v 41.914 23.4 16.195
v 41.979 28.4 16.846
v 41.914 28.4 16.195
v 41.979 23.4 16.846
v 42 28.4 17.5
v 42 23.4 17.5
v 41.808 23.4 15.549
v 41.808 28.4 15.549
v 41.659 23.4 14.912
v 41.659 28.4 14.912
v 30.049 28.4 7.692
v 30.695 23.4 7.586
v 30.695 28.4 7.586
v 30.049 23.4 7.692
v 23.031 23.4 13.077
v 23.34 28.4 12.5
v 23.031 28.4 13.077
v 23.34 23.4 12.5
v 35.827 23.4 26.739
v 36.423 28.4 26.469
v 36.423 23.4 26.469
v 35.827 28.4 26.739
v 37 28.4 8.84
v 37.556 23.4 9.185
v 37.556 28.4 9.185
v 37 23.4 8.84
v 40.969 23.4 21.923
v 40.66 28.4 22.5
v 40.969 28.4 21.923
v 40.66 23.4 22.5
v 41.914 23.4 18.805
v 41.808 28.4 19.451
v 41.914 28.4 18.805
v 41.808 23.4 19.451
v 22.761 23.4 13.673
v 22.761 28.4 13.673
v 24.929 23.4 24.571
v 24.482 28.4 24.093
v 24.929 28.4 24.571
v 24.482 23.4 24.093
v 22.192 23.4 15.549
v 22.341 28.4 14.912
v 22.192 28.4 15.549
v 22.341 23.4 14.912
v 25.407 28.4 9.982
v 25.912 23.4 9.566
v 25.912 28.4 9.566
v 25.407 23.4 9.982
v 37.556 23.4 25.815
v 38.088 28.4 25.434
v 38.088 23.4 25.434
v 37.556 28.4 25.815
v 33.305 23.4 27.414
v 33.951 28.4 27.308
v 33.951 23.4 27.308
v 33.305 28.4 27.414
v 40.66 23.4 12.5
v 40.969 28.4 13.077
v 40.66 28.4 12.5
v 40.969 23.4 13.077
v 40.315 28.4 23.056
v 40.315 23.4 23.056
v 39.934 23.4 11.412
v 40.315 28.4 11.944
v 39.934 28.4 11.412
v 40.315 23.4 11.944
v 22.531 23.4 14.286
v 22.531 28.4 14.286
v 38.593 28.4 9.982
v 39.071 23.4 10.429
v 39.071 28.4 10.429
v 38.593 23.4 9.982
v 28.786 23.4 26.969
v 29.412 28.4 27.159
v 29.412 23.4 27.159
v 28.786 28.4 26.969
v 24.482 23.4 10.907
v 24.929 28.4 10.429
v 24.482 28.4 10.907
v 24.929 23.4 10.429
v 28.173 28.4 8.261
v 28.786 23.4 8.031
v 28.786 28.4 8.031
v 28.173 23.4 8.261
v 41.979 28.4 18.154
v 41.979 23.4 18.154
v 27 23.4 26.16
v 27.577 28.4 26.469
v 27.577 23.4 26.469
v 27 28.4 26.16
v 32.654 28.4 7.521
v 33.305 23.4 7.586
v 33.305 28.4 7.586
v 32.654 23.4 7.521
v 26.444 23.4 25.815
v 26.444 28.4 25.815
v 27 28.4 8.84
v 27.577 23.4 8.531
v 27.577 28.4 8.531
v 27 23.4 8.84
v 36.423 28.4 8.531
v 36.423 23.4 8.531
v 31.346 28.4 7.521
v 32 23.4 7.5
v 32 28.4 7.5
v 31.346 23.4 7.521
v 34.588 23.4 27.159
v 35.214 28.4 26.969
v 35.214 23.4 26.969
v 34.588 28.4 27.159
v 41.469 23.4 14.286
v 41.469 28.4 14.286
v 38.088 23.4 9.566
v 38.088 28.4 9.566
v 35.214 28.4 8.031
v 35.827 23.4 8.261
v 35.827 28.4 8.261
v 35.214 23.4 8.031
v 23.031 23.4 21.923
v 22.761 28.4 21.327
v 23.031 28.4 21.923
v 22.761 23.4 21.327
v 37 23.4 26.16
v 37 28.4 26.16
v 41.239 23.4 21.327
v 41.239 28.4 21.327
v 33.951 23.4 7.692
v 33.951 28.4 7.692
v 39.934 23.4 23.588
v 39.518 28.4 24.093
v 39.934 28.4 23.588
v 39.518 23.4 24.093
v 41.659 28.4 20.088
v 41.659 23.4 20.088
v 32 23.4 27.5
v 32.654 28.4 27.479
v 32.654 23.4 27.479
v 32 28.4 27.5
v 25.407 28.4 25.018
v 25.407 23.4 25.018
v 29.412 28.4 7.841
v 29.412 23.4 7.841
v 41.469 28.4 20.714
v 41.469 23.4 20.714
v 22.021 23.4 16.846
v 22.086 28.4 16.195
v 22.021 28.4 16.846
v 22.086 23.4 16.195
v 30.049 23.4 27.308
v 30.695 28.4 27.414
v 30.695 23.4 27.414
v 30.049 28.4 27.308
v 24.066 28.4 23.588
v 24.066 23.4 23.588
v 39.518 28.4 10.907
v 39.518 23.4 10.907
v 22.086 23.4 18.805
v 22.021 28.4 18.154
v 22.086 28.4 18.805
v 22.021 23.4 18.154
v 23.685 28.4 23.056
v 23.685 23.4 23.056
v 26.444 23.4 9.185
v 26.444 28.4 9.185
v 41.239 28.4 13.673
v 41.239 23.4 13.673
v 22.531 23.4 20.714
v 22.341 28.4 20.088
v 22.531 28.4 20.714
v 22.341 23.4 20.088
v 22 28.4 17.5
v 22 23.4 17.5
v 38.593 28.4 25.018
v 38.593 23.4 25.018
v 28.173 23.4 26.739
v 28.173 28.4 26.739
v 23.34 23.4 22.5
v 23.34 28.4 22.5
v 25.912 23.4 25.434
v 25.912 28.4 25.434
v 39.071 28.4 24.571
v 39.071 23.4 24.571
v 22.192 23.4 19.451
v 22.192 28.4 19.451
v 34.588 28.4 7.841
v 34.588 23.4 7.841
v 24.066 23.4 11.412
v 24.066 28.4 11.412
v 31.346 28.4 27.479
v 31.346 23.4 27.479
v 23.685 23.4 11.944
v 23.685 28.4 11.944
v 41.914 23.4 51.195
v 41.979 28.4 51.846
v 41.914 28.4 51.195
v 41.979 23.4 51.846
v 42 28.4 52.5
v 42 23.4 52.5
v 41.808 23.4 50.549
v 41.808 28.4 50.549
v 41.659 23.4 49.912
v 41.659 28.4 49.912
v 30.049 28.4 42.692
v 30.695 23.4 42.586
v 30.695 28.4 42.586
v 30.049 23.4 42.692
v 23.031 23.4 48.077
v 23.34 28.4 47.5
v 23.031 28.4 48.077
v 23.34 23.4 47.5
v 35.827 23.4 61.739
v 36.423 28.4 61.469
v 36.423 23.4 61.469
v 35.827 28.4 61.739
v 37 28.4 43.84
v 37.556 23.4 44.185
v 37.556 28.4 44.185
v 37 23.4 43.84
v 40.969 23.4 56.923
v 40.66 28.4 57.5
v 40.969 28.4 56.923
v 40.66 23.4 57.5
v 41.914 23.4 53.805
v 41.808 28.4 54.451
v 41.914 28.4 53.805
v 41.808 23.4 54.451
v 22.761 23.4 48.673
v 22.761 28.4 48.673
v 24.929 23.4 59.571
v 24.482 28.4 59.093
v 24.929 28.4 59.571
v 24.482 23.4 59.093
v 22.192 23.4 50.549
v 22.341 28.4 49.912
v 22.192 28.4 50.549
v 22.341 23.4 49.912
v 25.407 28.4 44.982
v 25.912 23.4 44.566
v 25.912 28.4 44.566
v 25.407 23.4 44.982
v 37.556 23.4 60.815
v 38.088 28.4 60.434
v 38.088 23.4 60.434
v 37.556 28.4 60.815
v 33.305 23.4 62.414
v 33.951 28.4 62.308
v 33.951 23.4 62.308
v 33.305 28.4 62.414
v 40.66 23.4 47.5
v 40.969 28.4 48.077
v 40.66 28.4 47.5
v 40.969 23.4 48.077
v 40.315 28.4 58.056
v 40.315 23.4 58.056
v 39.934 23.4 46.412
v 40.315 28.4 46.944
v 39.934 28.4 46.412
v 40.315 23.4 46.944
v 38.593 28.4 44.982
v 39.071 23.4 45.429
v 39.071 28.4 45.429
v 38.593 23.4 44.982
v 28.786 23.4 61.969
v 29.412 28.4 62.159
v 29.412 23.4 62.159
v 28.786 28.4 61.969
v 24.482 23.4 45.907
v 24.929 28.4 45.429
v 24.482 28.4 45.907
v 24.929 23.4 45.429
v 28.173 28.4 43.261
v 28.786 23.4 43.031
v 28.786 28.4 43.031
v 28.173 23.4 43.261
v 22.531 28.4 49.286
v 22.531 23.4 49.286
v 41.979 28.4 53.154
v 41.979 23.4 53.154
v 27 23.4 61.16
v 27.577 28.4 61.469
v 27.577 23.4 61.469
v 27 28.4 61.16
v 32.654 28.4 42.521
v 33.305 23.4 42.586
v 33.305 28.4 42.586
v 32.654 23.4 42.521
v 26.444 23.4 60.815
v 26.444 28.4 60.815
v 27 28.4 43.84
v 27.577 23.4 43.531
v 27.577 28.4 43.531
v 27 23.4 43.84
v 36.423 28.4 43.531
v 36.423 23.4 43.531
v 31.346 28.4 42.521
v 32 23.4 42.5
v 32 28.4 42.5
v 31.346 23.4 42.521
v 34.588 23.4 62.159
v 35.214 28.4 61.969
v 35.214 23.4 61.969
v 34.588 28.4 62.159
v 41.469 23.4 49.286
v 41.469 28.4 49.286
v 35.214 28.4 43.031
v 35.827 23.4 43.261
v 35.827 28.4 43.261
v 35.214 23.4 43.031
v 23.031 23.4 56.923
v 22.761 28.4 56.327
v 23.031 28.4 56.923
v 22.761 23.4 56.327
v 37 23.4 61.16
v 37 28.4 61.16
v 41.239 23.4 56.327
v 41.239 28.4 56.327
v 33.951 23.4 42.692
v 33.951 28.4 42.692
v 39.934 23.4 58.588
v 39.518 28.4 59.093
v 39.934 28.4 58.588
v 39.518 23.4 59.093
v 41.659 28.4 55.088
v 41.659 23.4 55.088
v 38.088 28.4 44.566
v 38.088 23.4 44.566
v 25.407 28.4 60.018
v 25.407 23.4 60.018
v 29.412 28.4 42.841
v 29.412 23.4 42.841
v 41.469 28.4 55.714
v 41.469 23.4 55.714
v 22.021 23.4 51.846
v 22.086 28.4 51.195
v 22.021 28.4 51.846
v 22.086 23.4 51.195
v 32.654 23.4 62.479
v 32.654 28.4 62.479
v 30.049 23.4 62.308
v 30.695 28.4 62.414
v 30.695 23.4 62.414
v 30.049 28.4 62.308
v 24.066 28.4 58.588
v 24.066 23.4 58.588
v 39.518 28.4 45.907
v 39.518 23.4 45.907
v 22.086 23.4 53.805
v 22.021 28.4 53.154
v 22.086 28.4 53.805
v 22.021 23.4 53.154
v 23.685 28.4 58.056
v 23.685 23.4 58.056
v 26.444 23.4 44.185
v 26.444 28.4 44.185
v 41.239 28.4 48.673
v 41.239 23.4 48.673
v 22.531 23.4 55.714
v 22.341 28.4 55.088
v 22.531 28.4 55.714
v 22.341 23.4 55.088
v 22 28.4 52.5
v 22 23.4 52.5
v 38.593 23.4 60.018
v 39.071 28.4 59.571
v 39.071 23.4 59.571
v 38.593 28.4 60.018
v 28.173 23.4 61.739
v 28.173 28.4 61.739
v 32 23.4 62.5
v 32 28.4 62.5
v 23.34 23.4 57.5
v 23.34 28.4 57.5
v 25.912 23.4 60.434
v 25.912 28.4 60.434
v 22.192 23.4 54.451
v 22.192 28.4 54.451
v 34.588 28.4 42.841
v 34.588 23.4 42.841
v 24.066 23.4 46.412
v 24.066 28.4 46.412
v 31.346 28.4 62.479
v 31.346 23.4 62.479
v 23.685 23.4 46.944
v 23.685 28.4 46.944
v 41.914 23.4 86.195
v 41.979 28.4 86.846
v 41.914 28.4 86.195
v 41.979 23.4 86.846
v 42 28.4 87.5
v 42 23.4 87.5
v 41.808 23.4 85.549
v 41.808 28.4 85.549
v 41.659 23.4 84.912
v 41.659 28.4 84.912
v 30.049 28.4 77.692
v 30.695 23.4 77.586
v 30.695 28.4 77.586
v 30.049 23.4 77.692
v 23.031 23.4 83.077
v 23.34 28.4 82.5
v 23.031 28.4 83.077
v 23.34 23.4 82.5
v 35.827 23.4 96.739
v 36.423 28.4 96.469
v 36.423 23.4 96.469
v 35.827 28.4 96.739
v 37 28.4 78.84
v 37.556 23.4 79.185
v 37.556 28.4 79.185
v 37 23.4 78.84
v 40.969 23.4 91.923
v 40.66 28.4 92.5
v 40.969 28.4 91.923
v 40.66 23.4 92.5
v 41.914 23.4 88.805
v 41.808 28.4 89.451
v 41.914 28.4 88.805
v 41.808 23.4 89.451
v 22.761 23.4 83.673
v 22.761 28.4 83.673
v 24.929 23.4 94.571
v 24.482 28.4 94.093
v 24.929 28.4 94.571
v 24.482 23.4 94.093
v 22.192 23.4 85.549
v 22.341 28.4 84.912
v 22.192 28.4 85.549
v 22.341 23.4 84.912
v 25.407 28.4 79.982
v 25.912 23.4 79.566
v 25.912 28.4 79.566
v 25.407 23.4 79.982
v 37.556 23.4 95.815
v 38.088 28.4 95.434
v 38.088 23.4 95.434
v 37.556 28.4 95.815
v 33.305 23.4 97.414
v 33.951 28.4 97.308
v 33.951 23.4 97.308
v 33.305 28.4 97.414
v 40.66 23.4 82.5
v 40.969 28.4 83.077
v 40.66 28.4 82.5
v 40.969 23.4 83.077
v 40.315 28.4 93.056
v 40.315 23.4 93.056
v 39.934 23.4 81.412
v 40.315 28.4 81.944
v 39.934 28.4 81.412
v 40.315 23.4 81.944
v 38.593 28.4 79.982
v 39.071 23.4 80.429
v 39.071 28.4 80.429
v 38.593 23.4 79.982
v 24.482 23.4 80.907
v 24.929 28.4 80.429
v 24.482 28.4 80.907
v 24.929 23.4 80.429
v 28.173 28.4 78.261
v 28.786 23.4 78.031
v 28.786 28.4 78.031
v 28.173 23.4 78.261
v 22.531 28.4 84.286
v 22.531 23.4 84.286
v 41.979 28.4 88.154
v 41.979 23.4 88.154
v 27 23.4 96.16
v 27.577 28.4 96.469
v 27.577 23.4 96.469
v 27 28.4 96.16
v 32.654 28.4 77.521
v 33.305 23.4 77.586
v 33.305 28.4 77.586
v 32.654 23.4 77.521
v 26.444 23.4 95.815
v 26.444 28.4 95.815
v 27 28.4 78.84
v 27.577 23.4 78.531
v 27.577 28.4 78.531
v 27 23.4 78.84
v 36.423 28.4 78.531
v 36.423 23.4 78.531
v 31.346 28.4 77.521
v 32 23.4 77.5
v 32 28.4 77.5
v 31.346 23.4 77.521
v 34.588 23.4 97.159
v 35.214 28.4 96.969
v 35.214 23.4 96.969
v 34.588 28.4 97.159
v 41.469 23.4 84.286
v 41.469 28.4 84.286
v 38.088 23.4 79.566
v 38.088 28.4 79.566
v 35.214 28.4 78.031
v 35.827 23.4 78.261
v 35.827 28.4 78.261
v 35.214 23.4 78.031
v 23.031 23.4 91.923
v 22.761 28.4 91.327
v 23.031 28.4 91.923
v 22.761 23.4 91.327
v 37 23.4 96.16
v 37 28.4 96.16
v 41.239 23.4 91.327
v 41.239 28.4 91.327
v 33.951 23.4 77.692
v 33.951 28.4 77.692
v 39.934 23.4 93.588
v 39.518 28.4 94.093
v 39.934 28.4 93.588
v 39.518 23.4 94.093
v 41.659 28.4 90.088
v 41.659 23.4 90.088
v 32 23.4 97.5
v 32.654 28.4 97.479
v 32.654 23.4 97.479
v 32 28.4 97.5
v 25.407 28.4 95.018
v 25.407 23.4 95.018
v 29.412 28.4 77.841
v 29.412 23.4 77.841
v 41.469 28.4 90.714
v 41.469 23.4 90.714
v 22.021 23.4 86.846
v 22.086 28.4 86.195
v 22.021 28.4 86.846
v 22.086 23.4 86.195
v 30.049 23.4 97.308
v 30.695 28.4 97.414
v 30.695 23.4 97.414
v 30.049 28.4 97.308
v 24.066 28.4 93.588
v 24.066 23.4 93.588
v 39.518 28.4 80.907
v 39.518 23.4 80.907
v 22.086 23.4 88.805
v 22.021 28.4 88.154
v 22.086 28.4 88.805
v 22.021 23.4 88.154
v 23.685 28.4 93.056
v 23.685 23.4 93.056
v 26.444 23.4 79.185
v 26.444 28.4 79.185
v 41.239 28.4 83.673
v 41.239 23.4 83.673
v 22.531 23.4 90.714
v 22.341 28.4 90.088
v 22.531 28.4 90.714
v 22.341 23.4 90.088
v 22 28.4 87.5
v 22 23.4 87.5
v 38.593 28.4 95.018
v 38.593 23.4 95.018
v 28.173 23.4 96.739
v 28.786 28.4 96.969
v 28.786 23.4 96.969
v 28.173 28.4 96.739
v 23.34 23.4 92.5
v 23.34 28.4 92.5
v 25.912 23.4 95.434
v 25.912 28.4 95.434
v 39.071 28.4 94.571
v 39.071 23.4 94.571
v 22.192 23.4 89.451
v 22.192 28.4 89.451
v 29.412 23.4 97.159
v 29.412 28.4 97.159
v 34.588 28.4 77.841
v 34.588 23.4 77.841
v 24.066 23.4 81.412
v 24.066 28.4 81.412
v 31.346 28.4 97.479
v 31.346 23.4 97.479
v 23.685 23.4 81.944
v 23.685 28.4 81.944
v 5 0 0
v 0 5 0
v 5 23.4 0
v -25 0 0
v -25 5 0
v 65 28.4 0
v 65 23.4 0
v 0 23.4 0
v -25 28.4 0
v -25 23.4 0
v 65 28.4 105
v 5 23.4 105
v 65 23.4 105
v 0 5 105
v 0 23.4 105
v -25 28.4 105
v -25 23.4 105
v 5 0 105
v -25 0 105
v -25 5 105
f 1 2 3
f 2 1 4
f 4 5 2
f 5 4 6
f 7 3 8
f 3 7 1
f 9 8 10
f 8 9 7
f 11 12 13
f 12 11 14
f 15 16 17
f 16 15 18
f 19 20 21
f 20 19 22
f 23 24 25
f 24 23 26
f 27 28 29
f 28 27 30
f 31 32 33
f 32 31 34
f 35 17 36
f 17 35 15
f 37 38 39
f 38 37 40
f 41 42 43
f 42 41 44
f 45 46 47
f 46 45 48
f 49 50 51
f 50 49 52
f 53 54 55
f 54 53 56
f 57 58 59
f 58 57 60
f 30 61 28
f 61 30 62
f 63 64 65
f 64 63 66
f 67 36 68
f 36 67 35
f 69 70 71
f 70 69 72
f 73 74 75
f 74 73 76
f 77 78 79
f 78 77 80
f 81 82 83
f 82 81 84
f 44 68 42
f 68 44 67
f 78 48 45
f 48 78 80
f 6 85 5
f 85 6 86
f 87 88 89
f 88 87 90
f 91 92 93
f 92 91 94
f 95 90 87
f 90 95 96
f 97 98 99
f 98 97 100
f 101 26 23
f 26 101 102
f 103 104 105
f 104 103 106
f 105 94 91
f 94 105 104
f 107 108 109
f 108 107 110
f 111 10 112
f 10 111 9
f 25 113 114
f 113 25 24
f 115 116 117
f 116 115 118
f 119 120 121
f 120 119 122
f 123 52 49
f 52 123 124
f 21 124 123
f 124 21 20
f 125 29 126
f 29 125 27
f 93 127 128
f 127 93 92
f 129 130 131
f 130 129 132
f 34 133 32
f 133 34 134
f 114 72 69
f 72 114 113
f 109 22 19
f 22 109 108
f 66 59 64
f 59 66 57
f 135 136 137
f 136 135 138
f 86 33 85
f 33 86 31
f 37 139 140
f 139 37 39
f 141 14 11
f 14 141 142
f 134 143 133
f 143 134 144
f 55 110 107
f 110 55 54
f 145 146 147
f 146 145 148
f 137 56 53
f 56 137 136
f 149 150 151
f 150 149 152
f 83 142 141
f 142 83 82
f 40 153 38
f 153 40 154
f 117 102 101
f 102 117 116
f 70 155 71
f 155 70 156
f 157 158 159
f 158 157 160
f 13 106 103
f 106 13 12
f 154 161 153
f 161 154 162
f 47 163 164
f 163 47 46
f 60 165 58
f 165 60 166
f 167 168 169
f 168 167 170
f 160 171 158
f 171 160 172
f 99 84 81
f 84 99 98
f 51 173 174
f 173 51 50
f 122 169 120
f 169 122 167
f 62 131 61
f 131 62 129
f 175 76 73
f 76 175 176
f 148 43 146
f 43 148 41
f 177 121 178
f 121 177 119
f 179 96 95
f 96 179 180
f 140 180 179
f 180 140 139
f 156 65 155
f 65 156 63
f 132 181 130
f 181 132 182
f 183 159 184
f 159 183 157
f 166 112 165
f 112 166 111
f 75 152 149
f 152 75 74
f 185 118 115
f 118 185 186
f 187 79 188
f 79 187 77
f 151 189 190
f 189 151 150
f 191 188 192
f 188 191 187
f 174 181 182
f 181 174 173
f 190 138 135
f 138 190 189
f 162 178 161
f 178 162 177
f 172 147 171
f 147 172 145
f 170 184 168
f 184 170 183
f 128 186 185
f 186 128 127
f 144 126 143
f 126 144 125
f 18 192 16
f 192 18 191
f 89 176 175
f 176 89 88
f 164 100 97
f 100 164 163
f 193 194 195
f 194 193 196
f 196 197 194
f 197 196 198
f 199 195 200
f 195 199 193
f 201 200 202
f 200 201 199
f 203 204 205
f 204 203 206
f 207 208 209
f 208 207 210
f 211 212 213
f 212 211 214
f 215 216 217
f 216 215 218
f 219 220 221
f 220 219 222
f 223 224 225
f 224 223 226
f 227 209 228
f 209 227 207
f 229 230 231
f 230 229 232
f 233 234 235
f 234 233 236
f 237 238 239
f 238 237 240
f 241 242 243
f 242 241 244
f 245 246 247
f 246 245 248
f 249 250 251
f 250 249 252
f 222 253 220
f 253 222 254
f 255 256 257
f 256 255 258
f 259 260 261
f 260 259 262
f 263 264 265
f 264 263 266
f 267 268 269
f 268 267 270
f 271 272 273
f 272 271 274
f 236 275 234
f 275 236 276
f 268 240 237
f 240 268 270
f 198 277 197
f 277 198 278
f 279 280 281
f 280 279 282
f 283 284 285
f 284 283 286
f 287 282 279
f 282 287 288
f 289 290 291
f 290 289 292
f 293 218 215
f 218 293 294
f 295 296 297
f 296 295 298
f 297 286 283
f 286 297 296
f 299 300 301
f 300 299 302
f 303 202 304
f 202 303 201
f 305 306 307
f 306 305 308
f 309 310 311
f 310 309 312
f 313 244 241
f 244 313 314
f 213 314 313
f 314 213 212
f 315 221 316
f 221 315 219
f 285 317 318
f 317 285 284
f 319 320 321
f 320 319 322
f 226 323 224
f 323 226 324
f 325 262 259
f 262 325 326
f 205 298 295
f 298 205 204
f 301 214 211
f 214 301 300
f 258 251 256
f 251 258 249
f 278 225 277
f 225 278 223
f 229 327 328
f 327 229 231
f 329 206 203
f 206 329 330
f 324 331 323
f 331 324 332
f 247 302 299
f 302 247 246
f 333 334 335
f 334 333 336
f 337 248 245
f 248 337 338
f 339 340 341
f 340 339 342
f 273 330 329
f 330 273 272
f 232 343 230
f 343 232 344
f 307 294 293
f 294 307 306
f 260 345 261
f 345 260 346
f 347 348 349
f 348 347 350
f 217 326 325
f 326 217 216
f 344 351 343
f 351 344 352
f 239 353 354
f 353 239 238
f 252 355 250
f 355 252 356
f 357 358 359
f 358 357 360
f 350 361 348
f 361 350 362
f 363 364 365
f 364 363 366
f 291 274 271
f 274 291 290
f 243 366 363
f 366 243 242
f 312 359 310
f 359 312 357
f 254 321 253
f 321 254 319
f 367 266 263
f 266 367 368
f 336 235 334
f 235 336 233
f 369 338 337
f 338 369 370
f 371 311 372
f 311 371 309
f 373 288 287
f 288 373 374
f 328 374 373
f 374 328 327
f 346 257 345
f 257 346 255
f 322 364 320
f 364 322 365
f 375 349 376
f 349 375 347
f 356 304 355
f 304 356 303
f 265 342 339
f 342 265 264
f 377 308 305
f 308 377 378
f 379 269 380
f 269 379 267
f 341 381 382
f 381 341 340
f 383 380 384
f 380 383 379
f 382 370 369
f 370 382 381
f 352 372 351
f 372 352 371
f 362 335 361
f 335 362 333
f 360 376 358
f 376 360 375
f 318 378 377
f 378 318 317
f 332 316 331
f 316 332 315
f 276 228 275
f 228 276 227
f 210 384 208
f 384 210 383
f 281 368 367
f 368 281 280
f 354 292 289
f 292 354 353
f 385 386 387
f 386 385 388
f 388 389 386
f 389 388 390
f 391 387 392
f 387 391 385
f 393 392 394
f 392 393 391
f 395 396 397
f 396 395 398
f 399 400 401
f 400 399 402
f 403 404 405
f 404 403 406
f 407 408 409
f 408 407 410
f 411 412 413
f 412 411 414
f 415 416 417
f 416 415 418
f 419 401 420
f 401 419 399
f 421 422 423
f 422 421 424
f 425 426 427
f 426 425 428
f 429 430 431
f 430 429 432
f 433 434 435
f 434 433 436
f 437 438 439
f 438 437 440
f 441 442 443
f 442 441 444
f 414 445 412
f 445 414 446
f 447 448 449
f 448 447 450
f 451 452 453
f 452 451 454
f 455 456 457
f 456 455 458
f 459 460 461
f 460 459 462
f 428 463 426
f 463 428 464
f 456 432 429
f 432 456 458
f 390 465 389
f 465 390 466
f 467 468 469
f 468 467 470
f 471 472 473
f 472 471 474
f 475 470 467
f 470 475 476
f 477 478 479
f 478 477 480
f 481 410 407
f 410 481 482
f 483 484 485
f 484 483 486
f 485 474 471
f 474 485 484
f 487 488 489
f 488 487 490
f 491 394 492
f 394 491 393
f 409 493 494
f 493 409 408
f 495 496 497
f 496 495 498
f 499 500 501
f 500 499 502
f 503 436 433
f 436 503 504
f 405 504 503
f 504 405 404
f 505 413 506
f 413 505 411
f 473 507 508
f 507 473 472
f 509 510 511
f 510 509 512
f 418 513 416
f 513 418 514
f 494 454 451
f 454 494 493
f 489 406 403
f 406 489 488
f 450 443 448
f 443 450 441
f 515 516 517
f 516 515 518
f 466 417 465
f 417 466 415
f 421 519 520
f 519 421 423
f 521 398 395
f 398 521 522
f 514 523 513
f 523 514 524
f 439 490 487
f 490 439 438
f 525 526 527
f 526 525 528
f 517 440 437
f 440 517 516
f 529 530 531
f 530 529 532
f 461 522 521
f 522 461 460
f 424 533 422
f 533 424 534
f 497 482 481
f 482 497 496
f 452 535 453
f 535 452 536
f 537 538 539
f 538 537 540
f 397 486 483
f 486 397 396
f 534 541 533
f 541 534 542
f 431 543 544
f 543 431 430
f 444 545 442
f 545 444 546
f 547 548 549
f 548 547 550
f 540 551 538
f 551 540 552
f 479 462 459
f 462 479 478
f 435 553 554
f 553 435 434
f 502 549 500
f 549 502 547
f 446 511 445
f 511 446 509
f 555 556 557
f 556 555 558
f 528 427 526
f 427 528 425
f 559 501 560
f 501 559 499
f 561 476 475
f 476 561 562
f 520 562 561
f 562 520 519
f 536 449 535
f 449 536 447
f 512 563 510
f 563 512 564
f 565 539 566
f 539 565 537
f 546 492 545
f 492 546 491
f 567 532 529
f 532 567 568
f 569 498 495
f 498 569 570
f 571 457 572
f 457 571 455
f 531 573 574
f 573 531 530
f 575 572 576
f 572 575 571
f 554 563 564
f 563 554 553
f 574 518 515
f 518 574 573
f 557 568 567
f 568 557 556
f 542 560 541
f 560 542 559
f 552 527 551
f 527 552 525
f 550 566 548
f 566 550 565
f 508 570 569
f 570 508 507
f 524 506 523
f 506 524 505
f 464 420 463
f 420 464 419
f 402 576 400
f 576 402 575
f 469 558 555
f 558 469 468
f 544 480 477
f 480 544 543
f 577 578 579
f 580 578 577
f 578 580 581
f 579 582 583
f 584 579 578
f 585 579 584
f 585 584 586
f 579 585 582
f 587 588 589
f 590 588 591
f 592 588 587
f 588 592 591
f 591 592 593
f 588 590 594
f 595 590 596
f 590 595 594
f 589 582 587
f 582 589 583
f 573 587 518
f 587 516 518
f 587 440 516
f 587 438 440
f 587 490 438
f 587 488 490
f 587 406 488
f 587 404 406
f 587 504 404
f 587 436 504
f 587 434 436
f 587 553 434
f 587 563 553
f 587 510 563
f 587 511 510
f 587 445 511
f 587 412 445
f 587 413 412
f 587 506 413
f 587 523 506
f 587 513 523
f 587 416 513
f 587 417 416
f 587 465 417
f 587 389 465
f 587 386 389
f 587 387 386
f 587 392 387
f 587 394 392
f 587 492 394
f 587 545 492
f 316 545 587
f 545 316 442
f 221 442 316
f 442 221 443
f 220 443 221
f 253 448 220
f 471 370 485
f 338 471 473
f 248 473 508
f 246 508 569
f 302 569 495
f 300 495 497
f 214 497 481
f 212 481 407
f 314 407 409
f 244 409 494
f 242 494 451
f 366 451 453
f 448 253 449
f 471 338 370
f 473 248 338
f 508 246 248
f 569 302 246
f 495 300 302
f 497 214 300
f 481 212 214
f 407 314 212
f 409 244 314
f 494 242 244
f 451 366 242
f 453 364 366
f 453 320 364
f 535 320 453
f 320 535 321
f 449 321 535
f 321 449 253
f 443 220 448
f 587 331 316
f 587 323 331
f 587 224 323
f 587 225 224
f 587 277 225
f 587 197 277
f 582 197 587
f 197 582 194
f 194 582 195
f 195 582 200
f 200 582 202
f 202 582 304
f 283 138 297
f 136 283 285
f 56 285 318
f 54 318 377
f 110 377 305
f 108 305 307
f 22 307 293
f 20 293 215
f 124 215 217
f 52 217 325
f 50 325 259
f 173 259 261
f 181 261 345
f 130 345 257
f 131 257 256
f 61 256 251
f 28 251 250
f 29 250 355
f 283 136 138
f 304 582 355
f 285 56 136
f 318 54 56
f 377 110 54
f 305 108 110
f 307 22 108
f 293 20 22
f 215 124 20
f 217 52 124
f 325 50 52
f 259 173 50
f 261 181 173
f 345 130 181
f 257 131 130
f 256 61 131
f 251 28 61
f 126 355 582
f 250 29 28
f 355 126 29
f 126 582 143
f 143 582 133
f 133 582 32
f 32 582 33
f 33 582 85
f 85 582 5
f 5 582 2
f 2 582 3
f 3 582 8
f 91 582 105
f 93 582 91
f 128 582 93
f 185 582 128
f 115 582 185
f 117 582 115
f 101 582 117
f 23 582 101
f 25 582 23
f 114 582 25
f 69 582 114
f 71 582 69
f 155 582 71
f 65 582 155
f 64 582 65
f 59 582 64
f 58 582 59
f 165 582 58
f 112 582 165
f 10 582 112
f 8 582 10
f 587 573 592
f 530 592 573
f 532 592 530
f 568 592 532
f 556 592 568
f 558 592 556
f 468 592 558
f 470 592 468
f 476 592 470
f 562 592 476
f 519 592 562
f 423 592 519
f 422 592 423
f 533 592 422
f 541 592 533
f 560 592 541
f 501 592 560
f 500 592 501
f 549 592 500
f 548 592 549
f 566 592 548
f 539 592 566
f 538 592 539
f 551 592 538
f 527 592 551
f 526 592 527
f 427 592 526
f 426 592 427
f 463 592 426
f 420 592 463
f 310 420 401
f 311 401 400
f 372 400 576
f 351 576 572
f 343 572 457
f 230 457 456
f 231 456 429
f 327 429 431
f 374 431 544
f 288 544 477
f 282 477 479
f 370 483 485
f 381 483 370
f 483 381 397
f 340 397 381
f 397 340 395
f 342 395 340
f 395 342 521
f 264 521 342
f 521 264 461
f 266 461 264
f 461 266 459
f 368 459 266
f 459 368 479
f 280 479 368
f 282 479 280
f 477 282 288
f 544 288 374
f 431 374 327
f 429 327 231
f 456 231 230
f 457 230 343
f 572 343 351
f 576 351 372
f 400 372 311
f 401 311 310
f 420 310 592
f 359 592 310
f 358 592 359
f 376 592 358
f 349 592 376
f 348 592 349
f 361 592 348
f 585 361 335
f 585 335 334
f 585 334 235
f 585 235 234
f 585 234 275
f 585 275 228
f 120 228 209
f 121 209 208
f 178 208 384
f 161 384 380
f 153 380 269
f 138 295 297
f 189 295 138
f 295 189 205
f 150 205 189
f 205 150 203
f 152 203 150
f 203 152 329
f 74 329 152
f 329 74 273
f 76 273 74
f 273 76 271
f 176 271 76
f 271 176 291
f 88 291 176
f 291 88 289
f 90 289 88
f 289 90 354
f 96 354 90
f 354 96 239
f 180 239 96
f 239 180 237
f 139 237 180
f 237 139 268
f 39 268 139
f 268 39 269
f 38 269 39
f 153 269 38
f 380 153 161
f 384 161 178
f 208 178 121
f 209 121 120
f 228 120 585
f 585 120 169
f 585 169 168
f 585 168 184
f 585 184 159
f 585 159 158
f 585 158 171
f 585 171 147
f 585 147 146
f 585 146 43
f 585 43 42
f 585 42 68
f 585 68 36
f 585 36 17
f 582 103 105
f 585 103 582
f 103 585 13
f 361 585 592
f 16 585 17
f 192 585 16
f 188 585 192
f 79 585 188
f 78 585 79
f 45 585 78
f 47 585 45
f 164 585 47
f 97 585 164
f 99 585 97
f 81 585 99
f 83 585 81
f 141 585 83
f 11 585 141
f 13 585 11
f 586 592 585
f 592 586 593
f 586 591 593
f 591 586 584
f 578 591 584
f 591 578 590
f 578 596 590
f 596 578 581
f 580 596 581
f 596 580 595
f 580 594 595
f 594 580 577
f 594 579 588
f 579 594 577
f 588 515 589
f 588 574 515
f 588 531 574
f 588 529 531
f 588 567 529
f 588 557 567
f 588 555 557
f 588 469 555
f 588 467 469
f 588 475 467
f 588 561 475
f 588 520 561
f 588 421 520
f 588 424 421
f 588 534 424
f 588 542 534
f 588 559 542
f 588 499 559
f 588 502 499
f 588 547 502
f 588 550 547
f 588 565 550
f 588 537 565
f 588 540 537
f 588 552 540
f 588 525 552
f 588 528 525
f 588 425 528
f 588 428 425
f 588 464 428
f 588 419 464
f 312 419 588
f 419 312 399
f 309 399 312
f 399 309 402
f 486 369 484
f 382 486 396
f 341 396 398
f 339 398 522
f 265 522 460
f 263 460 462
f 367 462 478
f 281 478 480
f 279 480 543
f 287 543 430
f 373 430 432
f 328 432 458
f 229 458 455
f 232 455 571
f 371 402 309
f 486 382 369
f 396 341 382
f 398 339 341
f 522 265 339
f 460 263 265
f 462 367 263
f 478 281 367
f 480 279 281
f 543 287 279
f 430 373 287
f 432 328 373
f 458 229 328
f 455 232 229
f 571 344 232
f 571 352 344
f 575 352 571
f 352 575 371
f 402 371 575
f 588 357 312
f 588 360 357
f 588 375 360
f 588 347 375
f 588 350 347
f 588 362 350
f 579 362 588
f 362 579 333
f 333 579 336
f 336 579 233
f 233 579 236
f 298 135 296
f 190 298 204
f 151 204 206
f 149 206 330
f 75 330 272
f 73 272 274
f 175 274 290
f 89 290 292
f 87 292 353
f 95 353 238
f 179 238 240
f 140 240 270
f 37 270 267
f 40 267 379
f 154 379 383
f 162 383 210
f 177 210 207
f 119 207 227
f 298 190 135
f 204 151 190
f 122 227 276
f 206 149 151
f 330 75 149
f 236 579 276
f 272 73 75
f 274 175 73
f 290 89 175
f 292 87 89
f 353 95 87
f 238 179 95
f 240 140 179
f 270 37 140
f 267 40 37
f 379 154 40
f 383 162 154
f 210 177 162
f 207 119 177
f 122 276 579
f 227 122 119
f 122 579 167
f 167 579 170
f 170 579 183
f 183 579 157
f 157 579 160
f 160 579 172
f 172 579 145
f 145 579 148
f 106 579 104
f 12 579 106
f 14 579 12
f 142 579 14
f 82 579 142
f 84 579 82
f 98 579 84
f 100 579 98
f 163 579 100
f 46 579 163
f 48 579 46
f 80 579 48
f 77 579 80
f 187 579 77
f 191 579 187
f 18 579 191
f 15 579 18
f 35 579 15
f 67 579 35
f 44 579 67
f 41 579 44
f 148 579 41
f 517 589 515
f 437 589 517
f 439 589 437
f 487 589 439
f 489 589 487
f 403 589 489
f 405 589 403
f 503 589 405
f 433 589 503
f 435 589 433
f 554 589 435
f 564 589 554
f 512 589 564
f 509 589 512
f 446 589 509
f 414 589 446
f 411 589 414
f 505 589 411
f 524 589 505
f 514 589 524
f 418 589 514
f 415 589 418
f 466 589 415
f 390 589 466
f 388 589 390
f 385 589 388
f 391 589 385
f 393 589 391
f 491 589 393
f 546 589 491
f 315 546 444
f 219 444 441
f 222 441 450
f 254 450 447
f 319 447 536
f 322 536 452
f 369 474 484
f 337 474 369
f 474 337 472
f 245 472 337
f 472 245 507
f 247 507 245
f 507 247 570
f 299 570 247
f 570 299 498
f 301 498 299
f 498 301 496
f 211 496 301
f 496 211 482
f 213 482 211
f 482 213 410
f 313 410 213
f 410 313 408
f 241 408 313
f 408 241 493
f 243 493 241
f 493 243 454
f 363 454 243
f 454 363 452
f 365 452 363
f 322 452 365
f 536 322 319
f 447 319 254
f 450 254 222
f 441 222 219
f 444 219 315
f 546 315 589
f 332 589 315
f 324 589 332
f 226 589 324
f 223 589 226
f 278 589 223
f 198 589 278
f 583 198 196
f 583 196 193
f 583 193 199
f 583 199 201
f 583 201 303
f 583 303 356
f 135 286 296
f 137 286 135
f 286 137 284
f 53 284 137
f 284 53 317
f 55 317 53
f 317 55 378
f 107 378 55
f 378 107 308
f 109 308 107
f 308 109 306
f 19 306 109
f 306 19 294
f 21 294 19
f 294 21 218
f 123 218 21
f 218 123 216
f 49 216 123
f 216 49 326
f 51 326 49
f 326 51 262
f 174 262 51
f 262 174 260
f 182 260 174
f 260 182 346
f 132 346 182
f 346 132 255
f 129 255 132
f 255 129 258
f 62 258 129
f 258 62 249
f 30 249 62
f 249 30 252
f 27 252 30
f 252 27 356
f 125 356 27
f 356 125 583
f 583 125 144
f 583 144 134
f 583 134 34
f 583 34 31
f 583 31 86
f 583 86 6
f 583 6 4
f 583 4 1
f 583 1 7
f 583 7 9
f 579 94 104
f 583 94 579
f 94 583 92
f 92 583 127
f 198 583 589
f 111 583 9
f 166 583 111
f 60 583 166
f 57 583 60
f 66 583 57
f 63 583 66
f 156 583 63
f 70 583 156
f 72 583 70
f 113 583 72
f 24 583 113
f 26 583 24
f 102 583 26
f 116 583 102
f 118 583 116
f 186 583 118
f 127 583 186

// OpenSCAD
// KNOWN-WRONG PART (must fail): the holes are centred at x = 32 instead of 42
// Holder for 3 single-channel pipettes that clamps onto the front edge of an 18 mm shelf
// Category: quick fixes. A C-shaped clamp (spine, bottom jaw, top jaw) whose top jaw continues
// forward as an arm with three 20 mm holes; each pipette drops in and hangs by its handle.
// Modelled in print orientation: lying on its side, the profile in XY extruded along Z
// (in use +Y is up and +X points away from the shelf), so the jaws print as plain walls.
// Print: PETG (springier than PLA), 0.2 mm layers, 4 perimeters.
// SPDX-License-Identifier: CERN-OHL-P-2.0

/* [Holder] */
width = 105;              // extrusion length (along the shelf edge)
spine = [0, 5];           // x from, x to
jaw_back = -25;           // both jaws reach back to x = -25
jaw_t = 5;
gap = 18.4;               // 18 mm shelf + clearance
arm_front = 65;           // the top jaw continues forward to x = 65
hole_d = 20;
hole_x = 32;
hole_z = [17.5, 52.5, 87.5];

/* [Hidden] */
eps = 0.01;
H = jaw_t + gap + jaw_t;  // 28.4

difference() {
    linear_extrude(width) union() {
        translate([spine[0], 0]) square([spine[1] - spine[0], H]);
        translate([jaw_back, 0]) square([spine[1] - jaw_back, jaw_t]);
        translate([jaw_back, H - jaw_t]) square([arm_front - jaw_back, jaw_t]);
    }
    for (z = hole_z)
        translate([hole_x, H - jaw_t - 1, z]) rotate([-90, 0, 0]) cylinder(d = hole_d, h = jaw_t + 2, $fn = 96);
}
